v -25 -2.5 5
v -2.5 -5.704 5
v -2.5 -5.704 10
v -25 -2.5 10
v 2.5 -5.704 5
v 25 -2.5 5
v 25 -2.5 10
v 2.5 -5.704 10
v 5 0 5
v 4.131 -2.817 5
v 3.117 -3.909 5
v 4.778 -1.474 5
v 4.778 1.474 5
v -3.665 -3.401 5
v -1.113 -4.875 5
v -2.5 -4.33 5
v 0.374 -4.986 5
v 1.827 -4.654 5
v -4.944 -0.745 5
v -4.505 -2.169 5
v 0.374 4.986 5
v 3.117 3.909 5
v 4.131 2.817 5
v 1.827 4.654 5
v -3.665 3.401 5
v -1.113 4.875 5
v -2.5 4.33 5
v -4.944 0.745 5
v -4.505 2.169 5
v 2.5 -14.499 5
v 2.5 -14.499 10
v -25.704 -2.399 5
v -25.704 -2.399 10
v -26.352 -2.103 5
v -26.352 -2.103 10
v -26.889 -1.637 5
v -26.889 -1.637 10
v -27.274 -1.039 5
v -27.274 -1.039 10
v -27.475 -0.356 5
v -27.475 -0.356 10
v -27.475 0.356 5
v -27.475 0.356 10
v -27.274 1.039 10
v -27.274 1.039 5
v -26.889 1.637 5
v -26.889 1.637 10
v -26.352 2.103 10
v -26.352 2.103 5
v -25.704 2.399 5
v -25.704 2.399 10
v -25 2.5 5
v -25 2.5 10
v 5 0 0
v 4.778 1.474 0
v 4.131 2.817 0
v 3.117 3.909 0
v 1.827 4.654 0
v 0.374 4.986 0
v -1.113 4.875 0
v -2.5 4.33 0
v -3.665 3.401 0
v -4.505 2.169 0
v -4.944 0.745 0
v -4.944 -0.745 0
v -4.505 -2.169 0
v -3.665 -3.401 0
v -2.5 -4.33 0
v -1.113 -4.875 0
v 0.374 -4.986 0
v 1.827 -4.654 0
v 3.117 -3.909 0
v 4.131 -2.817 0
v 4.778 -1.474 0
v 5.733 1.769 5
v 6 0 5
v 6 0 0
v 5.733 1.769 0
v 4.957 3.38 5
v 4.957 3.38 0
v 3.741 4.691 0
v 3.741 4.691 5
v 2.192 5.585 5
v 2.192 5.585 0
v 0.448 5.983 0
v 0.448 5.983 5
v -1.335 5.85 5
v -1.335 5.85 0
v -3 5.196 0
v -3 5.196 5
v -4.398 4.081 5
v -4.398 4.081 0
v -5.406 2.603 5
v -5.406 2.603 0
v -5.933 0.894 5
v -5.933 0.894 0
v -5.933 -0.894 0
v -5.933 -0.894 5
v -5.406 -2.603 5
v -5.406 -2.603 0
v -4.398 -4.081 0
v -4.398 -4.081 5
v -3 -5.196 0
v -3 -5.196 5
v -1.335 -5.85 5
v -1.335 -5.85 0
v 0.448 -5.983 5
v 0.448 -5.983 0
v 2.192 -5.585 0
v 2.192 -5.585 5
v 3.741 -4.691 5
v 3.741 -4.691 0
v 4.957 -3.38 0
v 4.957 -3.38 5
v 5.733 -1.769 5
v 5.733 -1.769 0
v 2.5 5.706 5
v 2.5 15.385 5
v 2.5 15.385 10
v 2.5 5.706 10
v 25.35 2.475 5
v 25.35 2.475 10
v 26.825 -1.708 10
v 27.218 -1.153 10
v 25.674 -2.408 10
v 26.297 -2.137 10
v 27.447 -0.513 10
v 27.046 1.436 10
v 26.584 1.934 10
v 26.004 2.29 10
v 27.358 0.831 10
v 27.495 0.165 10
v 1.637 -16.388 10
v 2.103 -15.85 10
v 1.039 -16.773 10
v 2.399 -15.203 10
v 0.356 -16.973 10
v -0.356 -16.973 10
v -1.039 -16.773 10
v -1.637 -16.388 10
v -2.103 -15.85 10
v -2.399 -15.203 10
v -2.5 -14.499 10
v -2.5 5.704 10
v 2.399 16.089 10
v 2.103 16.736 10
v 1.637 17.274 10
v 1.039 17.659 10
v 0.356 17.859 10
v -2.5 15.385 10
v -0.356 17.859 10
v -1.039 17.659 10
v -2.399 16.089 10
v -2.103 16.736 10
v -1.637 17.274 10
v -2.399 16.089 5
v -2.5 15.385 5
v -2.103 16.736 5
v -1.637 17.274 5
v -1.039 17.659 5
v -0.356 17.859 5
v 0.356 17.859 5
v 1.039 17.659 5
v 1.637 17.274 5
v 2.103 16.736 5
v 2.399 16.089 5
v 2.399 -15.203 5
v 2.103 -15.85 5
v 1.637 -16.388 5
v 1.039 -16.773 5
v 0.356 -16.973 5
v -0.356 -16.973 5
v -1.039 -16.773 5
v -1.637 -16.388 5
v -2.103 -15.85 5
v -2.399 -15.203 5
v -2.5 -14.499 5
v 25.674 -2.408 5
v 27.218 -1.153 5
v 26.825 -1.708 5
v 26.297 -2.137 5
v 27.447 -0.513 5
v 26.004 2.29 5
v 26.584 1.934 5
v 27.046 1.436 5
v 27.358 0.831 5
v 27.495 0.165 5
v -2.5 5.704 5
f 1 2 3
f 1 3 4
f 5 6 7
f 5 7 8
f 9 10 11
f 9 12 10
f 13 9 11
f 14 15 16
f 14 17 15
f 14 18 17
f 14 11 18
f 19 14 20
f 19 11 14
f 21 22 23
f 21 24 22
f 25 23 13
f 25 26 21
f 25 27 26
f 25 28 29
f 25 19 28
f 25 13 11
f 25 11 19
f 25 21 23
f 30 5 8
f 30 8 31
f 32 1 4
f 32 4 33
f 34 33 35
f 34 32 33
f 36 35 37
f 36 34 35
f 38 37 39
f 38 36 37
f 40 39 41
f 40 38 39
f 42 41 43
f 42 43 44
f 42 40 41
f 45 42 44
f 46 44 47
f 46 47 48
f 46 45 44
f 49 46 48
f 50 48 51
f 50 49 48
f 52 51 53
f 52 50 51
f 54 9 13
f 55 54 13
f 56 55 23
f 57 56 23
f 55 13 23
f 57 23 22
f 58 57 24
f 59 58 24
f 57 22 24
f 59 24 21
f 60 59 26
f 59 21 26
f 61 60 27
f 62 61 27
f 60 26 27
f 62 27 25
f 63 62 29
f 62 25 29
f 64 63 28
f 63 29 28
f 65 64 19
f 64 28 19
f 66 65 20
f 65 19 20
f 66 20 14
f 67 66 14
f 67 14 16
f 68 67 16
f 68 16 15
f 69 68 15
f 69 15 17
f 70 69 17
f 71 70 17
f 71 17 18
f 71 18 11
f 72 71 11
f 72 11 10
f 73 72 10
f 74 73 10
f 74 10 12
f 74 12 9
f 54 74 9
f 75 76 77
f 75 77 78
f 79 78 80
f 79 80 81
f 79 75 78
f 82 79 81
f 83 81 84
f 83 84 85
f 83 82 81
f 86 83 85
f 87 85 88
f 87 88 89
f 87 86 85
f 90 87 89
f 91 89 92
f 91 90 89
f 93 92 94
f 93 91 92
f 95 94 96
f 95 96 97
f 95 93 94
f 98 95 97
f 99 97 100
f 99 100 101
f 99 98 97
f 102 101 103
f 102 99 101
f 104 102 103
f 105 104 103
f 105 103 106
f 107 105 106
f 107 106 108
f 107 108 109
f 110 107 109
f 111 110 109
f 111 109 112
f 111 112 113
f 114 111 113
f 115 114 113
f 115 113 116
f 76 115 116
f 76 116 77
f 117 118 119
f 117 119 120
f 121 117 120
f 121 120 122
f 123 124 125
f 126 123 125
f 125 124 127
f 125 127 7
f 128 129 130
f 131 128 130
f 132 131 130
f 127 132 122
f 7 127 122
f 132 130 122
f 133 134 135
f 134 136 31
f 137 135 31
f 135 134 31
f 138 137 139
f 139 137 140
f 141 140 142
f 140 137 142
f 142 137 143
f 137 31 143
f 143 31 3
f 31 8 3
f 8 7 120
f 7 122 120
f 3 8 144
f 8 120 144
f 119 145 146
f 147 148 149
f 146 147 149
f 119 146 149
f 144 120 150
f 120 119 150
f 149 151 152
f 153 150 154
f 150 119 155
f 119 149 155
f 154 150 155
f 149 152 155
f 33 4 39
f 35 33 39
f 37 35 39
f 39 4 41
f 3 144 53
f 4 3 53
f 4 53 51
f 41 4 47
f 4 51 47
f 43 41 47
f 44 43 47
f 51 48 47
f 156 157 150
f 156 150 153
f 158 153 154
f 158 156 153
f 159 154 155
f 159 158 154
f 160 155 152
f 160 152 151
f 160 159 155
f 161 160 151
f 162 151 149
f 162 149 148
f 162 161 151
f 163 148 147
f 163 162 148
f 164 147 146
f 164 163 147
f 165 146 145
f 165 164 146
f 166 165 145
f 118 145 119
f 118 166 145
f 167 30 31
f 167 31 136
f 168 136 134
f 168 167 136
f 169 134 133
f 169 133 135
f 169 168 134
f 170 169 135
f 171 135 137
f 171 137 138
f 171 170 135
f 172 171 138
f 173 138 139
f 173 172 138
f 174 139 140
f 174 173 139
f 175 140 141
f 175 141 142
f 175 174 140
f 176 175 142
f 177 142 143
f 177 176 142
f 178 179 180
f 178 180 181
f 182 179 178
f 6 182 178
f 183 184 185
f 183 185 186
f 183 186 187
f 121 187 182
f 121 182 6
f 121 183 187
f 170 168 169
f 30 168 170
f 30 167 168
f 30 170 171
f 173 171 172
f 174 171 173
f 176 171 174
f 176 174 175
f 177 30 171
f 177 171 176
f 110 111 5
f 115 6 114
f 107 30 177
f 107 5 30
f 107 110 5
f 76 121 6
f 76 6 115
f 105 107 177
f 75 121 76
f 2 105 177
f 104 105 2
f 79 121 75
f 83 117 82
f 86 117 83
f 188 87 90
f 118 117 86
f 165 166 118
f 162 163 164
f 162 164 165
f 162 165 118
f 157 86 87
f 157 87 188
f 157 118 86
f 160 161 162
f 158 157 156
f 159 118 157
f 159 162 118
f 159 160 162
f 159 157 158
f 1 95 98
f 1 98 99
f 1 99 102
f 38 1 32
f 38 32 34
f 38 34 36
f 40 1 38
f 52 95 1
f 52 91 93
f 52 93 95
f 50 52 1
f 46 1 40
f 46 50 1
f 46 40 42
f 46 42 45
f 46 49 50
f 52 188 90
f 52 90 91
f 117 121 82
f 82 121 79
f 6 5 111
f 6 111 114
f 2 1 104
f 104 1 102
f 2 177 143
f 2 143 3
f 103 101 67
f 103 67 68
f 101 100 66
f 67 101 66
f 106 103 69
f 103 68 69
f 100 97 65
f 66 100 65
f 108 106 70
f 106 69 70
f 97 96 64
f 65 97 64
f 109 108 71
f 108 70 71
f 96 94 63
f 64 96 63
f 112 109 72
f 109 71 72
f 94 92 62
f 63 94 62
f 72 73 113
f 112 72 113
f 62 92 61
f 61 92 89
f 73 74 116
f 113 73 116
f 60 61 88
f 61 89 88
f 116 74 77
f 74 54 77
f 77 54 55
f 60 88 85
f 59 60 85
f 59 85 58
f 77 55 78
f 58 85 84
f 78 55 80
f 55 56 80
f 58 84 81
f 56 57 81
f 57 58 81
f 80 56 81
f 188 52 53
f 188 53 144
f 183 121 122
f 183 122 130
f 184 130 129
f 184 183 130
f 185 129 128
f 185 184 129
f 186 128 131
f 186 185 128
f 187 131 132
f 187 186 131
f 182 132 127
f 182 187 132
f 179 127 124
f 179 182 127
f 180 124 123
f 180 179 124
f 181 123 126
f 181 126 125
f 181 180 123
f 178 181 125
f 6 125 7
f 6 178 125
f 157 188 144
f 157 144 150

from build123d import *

# Parameters (mm, degrees)
SWEEP_THIN1_PROFILE_R   = 6
SWEEP_THIN1_PROFILE_R_2 = 5
BOSS_EXTRUDE1_DEPTH     = 5


with BuildPart() as part:
    # Sweep-Thin1: sweep along a path in Sketch1
    with BuildLine(Plane.YZ) as sweep_thin1_path:
        Line((0, 0), (0, 5))
    # Sweep-Thin1 profile (on start of the path) → Sweep-Thin1 (sweep)
    with BuildSketch(Plane.XY):
        Circle(SWEEP_THIN1_PROFILE_R)
        Circle(SWEEP_THIN1_PROFILE_R_2, mode=Mode.SUBTRACT)
    sweep(path=sweep_thin1_path.line)

    # Sketch3 → Boss-Extrude1 (add)
    with BuildSketch(Plane.XY.offset(5)):
        with BuildLine():
            Line((-25, 2.5), (-2.5, 5.703923584))
            Line((-2.5, 5.703923584), (-2.5, 15.384581875))
            ThreePointArc((-2.5, 15.384581875), (0, 17.884581875), (2.5, 15.384581875))
            Line((2.5, 15.384581875), (2.5, 5.705628852))
            Line((2.5, 5.705628852), (25.349939608, 2.475387297))
            ThreePointArc((25.349939608, 2.475387297), (27.493839233, -0.175402049), (25, -2.5))
            Line((25, -2.5), (2.5, -5.703923584))
            Line((2.5, -5.703923584), (2.5, -14.498631066))
            ThreePointArc((2.5, -14.498631066), (0, -16.998631066), (-2.5, -14.498631066))
            Line((-2.5, -14.498631066), (-2.5, -5.703923584))
            Line((-2.5, -5.703923584), (-25, -2.5))
            ThreePointArc((-25, -2.5), (-27.5, 0), (-25, 2.5))
        make_face()
    extrude(amount=BOSS_EXTRUDE1_DEPTH)


solid = part.part
